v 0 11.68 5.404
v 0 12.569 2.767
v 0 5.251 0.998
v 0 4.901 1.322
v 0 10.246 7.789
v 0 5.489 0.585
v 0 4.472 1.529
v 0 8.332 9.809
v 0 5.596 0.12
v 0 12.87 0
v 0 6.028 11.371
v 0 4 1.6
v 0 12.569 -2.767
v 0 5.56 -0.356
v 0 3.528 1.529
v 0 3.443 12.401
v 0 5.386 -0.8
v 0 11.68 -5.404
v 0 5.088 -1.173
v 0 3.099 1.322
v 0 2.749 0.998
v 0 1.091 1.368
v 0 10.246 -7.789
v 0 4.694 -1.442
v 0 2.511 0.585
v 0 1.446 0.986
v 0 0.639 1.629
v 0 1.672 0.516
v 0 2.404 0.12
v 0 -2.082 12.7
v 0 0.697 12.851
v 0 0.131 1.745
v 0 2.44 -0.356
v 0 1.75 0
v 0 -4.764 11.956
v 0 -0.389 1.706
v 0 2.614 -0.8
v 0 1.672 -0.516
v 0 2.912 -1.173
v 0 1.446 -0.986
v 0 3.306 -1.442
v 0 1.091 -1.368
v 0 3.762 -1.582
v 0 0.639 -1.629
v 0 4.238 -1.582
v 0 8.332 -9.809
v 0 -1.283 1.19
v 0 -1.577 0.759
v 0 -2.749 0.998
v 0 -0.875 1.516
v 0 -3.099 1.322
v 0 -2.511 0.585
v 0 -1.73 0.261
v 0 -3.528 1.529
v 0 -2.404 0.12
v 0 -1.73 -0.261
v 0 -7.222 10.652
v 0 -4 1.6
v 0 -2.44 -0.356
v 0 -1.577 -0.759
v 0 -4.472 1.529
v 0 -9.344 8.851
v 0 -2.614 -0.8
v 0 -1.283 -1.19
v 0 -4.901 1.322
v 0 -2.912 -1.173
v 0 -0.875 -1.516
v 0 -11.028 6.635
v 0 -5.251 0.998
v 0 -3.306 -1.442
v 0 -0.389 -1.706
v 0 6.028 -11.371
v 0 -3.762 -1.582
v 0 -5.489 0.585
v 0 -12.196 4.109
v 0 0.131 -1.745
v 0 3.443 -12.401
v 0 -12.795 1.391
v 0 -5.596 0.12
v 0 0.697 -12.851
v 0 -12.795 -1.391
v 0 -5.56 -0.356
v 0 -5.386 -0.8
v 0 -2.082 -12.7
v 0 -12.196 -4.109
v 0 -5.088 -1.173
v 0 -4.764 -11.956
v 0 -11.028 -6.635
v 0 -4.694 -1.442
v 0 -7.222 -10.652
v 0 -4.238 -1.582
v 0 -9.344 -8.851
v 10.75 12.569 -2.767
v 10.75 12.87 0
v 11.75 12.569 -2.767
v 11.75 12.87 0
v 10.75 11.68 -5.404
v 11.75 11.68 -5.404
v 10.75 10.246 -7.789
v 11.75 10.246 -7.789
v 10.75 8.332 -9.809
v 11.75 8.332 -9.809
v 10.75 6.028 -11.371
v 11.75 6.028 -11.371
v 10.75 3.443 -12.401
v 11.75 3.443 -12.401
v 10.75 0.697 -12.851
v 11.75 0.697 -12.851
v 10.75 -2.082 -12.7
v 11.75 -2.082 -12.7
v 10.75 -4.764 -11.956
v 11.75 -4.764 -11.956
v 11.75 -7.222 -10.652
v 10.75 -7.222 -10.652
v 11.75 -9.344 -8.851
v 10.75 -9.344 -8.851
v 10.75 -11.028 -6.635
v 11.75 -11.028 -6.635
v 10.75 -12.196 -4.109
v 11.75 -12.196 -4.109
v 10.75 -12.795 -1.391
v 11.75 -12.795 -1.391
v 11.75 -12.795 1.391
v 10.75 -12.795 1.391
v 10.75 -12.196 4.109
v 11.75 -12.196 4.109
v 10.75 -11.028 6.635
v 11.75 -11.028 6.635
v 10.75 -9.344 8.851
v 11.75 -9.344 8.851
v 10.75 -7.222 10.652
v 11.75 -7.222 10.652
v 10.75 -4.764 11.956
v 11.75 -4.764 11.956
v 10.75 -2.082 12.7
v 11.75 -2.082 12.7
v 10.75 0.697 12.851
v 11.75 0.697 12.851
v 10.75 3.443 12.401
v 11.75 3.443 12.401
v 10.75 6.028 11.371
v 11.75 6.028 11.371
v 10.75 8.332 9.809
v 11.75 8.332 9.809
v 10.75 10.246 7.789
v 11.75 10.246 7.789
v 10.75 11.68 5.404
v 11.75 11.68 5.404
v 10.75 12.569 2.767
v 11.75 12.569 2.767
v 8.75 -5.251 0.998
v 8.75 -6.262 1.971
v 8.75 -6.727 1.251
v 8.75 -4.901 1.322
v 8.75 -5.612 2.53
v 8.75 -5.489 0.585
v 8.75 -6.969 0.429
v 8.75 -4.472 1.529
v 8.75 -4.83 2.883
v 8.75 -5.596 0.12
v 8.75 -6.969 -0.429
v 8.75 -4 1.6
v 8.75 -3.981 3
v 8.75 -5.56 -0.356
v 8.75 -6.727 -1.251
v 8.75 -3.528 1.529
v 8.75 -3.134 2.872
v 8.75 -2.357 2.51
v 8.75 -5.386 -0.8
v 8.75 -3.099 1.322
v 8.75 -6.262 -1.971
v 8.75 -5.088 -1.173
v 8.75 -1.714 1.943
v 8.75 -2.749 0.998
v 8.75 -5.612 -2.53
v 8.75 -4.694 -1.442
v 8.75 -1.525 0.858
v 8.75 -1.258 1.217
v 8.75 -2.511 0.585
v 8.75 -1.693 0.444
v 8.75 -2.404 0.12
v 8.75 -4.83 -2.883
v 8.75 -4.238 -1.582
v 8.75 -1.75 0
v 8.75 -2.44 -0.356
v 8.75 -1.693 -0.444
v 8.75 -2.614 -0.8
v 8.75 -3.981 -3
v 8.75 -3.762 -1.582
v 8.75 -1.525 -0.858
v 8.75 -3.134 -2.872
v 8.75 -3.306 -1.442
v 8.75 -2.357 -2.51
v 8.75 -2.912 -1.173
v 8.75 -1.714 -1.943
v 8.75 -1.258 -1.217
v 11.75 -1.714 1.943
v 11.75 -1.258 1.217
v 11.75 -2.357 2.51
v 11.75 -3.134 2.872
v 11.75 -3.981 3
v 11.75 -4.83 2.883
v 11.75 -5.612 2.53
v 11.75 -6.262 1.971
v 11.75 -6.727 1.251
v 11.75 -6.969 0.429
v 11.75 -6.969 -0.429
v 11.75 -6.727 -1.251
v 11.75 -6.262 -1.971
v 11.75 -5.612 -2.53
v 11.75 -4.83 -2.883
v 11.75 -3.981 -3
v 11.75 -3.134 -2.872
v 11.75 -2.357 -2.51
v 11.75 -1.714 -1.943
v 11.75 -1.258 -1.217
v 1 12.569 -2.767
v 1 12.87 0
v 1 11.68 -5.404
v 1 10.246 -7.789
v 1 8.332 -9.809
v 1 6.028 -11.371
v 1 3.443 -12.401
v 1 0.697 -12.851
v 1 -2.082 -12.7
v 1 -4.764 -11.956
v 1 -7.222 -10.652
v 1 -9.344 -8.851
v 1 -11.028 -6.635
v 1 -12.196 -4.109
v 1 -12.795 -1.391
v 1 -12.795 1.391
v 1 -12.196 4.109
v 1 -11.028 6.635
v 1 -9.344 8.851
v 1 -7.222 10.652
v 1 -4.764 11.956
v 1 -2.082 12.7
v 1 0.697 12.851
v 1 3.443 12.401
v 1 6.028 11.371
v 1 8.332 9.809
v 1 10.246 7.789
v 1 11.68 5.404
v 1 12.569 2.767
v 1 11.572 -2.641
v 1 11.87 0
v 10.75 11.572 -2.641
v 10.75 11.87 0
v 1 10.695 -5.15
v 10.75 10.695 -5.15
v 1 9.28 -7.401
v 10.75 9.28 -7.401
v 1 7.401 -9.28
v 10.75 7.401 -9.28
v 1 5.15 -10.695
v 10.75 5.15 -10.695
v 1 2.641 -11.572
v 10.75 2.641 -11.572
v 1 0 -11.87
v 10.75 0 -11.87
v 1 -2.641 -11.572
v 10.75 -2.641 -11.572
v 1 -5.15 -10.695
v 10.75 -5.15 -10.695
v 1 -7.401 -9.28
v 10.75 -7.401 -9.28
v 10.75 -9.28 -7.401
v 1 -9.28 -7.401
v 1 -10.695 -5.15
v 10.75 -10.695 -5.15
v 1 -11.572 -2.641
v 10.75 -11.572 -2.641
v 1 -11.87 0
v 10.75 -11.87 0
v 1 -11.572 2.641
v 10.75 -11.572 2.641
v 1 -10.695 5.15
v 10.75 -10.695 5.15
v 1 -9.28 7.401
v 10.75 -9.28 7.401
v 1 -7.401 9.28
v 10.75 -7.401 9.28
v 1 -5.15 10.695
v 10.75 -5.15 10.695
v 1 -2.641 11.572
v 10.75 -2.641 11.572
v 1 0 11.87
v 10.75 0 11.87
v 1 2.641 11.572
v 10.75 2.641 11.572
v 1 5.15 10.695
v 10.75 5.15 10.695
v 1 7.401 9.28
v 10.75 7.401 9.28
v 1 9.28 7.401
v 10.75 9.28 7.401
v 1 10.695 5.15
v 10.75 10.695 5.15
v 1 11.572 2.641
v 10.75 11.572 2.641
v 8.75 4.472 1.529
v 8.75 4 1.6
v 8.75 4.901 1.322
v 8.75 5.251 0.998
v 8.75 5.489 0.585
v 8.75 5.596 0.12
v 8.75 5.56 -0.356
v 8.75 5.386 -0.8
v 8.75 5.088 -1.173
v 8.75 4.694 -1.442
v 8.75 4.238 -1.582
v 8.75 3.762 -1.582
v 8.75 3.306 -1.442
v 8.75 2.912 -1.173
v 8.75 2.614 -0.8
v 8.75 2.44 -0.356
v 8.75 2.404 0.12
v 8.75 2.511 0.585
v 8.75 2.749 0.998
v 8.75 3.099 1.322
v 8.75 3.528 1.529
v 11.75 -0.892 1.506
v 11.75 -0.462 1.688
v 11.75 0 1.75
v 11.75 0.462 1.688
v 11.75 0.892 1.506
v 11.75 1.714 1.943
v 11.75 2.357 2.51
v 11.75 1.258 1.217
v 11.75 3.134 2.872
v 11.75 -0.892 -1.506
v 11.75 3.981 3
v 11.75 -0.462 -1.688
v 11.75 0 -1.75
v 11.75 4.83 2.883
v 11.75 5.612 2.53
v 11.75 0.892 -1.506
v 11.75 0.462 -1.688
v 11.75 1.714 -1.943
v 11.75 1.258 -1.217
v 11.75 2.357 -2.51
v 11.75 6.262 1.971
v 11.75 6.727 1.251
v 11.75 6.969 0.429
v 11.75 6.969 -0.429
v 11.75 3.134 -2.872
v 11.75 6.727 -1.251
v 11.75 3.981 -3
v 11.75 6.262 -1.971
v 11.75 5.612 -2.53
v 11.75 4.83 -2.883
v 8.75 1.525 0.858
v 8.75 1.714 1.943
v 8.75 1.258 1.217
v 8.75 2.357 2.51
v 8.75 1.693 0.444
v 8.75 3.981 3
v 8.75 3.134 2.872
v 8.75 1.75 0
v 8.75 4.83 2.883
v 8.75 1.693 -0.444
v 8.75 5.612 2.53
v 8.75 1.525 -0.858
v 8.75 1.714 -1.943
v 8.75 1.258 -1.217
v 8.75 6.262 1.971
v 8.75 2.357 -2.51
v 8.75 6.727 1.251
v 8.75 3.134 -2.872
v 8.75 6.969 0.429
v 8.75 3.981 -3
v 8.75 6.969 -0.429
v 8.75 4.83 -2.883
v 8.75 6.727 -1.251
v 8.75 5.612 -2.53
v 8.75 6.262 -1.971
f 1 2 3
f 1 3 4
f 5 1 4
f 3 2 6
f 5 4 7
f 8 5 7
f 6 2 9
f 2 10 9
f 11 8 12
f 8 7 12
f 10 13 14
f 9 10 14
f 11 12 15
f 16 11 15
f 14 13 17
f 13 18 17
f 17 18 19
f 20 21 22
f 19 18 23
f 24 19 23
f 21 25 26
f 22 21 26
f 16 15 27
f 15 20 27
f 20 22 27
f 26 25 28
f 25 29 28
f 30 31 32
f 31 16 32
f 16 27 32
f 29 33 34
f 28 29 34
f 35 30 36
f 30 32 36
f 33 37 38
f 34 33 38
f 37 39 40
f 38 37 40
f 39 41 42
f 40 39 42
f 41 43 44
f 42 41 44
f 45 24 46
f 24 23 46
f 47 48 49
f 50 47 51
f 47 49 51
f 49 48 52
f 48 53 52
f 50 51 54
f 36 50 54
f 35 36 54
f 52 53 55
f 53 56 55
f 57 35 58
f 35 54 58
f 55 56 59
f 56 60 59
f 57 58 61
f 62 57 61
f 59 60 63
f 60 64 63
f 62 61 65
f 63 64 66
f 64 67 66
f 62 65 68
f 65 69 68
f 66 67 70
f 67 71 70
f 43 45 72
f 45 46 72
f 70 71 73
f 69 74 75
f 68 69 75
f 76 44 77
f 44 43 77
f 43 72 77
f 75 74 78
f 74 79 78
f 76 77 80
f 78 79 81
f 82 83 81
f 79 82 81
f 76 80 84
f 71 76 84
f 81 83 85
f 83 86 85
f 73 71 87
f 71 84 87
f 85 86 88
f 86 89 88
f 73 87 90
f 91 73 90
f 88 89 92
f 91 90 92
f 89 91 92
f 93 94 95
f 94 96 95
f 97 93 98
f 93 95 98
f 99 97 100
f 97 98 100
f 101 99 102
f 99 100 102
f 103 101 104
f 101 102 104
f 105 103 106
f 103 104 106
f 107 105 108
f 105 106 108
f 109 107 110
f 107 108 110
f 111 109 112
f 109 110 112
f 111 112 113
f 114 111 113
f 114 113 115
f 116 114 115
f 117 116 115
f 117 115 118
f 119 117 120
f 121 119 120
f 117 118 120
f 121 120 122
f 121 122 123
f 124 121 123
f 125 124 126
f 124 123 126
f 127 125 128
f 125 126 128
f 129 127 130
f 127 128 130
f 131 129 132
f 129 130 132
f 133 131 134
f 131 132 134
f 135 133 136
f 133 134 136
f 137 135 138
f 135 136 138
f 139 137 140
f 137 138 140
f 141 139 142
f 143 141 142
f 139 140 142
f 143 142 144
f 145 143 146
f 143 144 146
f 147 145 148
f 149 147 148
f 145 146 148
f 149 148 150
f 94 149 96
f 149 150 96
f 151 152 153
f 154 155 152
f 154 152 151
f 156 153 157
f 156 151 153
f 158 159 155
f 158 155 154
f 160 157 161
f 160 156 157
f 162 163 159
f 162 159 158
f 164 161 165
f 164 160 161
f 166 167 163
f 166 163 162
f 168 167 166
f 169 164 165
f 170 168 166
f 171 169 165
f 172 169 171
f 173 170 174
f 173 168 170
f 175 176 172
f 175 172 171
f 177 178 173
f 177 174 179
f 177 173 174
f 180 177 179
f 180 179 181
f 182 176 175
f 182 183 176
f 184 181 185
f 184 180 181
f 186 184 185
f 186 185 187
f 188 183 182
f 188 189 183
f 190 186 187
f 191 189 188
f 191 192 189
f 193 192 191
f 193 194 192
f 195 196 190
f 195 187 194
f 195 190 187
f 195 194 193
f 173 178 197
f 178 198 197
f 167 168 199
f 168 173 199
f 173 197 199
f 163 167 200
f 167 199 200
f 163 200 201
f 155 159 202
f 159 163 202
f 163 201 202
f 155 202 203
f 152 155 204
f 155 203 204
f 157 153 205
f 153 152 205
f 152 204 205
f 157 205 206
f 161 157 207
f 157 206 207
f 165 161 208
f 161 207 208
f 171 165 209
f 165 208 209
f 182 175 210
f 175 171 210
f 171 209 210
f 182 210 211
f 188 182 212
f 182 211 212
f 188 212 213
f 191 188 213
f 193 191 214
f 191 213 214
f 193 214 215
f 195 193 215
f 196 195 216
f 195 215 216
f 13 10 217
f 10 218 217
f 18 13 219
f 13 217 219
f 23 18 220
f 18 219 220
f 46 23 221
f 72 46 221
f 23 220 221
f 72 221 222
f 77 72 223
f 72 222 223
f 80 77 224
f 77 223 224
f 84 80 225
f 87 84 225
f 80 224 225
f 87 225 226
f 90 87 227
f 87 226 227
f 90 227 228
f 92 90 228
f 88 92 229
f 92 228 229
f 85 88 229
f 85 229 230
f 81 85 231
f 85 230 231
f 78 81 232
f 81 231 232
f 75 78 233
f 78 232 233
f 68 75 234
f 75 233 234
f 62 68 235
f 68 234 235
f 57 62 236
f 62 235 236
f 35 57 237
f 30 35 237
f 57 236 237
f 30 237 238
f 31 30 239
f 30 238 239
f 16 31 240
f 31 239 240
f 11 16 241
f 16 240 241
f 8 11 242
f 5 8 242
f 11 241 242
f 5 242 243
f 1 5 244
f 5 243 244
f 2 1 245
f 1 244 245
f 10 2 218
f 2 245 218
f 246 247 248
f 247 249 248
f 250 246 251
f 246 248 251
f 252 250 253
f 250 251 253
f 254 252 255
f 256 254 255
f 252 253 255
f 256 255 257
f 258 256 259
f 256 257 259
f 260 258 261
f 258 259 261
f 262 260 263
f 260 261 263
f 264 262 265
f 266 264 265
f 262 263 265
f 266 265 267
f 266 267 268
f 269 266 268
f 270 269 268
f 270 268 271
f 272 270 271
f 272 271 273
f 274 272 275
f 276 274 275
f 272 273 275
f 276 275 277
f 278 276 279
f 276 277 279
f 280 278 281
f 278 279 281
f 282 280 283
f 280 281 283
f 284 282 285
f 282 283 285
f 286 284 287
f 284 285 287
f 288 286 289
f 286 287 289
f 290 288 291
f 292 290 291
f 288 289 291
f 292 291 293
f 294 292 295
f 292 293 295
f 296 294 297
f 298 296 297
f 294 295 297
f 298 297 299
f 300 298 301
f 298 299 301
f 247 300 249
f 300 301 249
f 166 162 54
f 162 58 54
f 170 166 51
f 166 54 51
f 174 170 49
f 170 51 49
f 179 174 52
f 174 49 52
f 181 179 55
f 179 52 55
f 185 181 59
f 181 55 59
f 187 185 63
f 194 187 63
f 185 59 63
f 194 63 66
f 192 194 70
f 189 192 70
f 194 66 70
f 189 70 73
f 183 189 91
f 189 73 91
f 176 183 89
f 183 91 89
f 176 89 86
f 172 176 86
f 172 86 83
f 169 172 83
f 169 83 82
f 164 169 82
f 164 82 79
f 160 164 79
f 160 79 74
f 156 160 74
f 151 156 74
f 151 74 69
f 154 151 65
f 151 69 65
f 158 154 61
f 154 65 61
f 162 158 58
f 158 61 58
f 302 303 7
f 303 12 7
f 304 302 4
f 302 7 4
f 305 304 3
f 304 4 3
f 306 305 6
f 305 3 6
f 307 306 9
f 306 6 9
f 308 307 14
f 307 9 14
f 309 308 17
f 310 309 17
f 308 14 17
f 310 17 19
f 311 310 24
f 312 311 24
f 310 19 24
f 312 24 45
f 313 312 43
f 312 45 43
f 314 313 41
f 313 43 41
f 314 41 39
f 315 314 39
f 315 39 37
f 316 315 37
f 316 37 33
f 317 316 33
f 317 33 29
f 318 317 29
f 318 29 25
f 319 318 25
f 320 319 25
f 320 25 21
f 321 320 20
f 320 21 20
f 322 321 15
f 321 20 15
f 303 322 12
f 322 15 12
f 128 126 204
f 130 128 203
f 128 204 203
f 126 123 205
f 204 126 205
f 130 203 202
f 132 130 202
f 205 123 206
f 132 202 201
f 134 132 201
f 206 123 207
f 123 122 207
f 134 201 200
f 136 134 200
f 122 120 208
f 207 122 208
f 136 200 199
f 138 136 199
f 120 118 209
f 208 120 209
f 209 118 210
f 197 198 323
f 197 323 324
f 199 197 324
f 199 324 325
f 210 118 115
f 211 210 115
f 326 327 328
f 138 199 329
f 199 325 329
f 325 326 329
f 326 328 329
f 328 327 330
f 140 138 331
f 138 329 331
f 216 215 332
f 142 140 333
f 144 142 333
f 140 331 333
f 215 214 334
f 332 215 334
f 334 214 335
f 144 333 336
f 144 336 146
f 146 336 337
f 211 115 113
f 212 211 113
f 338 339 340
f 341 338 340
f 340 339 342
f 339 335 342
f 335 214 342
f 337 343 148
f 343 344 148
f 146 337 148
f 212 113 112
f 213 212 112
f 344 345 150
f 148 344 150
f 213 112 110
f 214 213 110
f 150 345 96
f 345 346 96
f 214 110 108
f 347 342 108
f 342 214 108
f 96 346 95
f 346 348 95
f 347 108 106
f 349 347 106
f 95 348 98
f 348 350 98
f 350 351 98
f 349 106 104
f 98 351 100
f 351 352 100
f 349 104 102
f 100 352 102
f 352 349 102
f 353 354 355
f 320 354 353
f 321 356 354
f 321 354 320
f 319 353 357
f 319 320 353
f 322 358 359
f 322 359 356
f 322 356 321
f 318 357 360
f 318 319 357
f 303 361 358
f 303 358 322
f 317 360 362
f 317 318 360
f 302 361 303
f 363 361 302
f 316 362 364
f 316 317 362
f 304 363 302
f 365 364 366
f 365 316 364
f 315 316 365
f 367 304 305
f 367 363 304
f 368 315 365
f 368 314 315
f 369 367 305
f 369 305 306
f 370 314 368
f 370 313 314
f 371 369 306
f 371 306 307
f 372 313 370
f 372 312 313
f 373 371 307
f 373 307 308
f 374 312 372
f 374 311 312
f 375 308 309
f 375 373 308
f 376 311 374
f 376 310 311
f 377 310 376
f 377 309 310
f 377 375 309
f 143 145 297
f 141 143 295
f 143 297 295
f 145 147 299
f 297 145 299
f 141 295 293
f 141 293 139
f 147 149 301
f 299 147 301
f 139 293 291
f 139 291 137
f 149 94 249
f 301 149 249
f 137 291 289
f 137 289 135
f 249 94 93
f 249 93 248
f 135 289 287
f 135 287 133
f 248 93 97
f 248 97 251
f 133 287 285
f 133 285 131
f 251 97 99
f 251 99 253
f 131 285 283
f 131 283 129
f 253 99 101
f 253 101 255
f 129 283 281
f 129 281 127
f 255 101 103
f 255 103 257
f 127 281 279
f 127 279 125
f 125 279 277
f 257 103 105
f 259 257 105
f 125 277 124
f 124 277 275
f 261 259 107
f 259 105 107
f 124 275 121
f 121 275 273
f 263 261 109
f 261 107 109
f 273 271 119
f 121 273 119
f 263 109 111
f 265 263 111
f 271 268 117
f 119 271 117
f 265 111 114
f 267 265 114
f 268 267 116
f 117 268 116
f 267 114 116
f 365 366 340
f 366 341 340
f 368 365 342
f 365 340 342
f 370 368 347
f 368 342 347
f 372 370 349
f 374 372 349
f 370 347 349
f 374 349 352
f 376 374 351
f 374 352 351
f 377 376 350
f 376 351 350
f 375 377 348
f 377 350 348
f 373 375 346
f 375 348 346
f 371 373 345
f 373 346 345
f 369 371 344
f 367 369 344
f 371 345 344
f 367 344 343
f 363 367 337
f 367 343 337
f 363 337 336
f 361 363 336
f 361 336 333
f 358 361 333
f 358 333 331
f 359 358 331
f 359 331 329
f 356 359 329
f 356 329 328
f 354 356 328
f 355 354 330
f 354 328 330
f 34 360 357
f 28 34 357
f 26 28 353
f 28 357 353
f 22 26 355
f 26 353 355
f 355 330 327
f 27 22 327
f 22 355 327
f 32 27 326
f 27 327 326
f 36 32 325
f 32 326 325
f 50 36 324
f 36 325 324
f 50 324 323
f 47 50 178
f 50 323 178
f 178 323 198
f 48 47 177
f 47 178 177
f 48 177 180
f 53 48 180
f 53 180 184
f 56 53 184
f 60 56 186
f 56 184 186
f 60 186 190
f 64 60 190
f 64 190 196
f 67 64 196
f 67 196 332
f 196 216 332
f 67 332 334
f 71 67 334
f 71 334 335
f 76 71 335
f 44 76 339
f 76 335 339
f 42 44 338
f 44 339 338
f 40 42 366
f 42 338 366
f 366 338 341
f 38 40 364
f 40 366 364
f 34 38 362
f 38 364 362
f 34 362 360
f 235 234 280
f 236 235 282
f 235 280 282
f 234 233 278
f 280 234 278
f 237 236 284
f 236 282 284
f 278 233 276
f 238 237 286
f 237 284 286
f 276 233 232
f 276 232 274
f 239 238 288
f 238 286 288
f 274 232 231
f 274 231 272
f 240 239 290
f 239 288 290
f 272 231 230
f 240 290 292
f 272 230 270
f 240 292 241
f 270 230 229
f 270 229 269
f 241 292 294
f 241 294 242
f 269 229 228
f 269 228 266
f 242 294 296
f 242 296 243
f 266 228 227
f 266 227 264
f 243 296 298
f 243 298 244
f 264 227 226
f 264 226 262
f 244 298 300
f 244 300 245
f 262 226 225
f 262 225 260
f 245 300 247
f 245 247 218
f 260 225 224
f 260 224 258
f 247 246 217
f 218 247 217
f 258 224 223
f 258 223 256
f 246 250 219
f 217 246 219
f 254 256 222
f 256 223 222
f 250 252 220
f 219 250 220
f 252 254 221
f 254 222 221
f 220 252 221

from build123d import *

# Parameters (mm, degrees)
SKETCH7_R                      = 1.75
CUT_EXTRUDE1_DEPTH             = 22.664170882
CBORE_FOR_M3_SHCS1_D           = 3.2
CBORE_FOR_M3_SHCS1_CBORE_D     = 6
CBORE_FOR_M3_SHCS1_CBORE_DEPTH = 3


with BuildPart() as part:
    # Sketch2 → Revolve1 (revolve)
    with BuildSketch(Plane.XY):
        Polygon((0, 0), (0, 12.87), (1, 12.87), (1, 11.87), (10.75, 11.87), (10.75, 12.87), (11.75, 12.87), (11.75, 0), align=None)
    revolve(axis=Axis((11.75, 0, 0), (-1, 0, 0)))

    # Sketch7 → Cut-Extrude1 (cut, through all)
    with BuildSketch(Plane(origin=(11.75, 0, 0), x_dir=(0, 0, -1), z_dir=(1, 0, 0))):
        with Locations(Location((0, 0, 0), (0, 0, 90))):
            Circle(SKETCH7_R)
    extrude(amount=-CUT_EXTRUDE1_DEPTH, mode=Mode.SUBTRACT)

    # CBORE for M3 SHCS1 (through all)
    with Locations(Plane(origin=(11.75, 0, 0), x_dir=(0, 0, -1), z_dir=(1, 0, 0))):
        with Locations((0, -4), (0, 4)):
            CounterBoreHole(CBORE_FOR_M3_SHCS1_D / 2, CBORE_FOR_M3_SHCS1_CBORE_D / 2, CBORE_FOR_M3_SHCS1_CBORE_DEPTH)


solid = part.part
